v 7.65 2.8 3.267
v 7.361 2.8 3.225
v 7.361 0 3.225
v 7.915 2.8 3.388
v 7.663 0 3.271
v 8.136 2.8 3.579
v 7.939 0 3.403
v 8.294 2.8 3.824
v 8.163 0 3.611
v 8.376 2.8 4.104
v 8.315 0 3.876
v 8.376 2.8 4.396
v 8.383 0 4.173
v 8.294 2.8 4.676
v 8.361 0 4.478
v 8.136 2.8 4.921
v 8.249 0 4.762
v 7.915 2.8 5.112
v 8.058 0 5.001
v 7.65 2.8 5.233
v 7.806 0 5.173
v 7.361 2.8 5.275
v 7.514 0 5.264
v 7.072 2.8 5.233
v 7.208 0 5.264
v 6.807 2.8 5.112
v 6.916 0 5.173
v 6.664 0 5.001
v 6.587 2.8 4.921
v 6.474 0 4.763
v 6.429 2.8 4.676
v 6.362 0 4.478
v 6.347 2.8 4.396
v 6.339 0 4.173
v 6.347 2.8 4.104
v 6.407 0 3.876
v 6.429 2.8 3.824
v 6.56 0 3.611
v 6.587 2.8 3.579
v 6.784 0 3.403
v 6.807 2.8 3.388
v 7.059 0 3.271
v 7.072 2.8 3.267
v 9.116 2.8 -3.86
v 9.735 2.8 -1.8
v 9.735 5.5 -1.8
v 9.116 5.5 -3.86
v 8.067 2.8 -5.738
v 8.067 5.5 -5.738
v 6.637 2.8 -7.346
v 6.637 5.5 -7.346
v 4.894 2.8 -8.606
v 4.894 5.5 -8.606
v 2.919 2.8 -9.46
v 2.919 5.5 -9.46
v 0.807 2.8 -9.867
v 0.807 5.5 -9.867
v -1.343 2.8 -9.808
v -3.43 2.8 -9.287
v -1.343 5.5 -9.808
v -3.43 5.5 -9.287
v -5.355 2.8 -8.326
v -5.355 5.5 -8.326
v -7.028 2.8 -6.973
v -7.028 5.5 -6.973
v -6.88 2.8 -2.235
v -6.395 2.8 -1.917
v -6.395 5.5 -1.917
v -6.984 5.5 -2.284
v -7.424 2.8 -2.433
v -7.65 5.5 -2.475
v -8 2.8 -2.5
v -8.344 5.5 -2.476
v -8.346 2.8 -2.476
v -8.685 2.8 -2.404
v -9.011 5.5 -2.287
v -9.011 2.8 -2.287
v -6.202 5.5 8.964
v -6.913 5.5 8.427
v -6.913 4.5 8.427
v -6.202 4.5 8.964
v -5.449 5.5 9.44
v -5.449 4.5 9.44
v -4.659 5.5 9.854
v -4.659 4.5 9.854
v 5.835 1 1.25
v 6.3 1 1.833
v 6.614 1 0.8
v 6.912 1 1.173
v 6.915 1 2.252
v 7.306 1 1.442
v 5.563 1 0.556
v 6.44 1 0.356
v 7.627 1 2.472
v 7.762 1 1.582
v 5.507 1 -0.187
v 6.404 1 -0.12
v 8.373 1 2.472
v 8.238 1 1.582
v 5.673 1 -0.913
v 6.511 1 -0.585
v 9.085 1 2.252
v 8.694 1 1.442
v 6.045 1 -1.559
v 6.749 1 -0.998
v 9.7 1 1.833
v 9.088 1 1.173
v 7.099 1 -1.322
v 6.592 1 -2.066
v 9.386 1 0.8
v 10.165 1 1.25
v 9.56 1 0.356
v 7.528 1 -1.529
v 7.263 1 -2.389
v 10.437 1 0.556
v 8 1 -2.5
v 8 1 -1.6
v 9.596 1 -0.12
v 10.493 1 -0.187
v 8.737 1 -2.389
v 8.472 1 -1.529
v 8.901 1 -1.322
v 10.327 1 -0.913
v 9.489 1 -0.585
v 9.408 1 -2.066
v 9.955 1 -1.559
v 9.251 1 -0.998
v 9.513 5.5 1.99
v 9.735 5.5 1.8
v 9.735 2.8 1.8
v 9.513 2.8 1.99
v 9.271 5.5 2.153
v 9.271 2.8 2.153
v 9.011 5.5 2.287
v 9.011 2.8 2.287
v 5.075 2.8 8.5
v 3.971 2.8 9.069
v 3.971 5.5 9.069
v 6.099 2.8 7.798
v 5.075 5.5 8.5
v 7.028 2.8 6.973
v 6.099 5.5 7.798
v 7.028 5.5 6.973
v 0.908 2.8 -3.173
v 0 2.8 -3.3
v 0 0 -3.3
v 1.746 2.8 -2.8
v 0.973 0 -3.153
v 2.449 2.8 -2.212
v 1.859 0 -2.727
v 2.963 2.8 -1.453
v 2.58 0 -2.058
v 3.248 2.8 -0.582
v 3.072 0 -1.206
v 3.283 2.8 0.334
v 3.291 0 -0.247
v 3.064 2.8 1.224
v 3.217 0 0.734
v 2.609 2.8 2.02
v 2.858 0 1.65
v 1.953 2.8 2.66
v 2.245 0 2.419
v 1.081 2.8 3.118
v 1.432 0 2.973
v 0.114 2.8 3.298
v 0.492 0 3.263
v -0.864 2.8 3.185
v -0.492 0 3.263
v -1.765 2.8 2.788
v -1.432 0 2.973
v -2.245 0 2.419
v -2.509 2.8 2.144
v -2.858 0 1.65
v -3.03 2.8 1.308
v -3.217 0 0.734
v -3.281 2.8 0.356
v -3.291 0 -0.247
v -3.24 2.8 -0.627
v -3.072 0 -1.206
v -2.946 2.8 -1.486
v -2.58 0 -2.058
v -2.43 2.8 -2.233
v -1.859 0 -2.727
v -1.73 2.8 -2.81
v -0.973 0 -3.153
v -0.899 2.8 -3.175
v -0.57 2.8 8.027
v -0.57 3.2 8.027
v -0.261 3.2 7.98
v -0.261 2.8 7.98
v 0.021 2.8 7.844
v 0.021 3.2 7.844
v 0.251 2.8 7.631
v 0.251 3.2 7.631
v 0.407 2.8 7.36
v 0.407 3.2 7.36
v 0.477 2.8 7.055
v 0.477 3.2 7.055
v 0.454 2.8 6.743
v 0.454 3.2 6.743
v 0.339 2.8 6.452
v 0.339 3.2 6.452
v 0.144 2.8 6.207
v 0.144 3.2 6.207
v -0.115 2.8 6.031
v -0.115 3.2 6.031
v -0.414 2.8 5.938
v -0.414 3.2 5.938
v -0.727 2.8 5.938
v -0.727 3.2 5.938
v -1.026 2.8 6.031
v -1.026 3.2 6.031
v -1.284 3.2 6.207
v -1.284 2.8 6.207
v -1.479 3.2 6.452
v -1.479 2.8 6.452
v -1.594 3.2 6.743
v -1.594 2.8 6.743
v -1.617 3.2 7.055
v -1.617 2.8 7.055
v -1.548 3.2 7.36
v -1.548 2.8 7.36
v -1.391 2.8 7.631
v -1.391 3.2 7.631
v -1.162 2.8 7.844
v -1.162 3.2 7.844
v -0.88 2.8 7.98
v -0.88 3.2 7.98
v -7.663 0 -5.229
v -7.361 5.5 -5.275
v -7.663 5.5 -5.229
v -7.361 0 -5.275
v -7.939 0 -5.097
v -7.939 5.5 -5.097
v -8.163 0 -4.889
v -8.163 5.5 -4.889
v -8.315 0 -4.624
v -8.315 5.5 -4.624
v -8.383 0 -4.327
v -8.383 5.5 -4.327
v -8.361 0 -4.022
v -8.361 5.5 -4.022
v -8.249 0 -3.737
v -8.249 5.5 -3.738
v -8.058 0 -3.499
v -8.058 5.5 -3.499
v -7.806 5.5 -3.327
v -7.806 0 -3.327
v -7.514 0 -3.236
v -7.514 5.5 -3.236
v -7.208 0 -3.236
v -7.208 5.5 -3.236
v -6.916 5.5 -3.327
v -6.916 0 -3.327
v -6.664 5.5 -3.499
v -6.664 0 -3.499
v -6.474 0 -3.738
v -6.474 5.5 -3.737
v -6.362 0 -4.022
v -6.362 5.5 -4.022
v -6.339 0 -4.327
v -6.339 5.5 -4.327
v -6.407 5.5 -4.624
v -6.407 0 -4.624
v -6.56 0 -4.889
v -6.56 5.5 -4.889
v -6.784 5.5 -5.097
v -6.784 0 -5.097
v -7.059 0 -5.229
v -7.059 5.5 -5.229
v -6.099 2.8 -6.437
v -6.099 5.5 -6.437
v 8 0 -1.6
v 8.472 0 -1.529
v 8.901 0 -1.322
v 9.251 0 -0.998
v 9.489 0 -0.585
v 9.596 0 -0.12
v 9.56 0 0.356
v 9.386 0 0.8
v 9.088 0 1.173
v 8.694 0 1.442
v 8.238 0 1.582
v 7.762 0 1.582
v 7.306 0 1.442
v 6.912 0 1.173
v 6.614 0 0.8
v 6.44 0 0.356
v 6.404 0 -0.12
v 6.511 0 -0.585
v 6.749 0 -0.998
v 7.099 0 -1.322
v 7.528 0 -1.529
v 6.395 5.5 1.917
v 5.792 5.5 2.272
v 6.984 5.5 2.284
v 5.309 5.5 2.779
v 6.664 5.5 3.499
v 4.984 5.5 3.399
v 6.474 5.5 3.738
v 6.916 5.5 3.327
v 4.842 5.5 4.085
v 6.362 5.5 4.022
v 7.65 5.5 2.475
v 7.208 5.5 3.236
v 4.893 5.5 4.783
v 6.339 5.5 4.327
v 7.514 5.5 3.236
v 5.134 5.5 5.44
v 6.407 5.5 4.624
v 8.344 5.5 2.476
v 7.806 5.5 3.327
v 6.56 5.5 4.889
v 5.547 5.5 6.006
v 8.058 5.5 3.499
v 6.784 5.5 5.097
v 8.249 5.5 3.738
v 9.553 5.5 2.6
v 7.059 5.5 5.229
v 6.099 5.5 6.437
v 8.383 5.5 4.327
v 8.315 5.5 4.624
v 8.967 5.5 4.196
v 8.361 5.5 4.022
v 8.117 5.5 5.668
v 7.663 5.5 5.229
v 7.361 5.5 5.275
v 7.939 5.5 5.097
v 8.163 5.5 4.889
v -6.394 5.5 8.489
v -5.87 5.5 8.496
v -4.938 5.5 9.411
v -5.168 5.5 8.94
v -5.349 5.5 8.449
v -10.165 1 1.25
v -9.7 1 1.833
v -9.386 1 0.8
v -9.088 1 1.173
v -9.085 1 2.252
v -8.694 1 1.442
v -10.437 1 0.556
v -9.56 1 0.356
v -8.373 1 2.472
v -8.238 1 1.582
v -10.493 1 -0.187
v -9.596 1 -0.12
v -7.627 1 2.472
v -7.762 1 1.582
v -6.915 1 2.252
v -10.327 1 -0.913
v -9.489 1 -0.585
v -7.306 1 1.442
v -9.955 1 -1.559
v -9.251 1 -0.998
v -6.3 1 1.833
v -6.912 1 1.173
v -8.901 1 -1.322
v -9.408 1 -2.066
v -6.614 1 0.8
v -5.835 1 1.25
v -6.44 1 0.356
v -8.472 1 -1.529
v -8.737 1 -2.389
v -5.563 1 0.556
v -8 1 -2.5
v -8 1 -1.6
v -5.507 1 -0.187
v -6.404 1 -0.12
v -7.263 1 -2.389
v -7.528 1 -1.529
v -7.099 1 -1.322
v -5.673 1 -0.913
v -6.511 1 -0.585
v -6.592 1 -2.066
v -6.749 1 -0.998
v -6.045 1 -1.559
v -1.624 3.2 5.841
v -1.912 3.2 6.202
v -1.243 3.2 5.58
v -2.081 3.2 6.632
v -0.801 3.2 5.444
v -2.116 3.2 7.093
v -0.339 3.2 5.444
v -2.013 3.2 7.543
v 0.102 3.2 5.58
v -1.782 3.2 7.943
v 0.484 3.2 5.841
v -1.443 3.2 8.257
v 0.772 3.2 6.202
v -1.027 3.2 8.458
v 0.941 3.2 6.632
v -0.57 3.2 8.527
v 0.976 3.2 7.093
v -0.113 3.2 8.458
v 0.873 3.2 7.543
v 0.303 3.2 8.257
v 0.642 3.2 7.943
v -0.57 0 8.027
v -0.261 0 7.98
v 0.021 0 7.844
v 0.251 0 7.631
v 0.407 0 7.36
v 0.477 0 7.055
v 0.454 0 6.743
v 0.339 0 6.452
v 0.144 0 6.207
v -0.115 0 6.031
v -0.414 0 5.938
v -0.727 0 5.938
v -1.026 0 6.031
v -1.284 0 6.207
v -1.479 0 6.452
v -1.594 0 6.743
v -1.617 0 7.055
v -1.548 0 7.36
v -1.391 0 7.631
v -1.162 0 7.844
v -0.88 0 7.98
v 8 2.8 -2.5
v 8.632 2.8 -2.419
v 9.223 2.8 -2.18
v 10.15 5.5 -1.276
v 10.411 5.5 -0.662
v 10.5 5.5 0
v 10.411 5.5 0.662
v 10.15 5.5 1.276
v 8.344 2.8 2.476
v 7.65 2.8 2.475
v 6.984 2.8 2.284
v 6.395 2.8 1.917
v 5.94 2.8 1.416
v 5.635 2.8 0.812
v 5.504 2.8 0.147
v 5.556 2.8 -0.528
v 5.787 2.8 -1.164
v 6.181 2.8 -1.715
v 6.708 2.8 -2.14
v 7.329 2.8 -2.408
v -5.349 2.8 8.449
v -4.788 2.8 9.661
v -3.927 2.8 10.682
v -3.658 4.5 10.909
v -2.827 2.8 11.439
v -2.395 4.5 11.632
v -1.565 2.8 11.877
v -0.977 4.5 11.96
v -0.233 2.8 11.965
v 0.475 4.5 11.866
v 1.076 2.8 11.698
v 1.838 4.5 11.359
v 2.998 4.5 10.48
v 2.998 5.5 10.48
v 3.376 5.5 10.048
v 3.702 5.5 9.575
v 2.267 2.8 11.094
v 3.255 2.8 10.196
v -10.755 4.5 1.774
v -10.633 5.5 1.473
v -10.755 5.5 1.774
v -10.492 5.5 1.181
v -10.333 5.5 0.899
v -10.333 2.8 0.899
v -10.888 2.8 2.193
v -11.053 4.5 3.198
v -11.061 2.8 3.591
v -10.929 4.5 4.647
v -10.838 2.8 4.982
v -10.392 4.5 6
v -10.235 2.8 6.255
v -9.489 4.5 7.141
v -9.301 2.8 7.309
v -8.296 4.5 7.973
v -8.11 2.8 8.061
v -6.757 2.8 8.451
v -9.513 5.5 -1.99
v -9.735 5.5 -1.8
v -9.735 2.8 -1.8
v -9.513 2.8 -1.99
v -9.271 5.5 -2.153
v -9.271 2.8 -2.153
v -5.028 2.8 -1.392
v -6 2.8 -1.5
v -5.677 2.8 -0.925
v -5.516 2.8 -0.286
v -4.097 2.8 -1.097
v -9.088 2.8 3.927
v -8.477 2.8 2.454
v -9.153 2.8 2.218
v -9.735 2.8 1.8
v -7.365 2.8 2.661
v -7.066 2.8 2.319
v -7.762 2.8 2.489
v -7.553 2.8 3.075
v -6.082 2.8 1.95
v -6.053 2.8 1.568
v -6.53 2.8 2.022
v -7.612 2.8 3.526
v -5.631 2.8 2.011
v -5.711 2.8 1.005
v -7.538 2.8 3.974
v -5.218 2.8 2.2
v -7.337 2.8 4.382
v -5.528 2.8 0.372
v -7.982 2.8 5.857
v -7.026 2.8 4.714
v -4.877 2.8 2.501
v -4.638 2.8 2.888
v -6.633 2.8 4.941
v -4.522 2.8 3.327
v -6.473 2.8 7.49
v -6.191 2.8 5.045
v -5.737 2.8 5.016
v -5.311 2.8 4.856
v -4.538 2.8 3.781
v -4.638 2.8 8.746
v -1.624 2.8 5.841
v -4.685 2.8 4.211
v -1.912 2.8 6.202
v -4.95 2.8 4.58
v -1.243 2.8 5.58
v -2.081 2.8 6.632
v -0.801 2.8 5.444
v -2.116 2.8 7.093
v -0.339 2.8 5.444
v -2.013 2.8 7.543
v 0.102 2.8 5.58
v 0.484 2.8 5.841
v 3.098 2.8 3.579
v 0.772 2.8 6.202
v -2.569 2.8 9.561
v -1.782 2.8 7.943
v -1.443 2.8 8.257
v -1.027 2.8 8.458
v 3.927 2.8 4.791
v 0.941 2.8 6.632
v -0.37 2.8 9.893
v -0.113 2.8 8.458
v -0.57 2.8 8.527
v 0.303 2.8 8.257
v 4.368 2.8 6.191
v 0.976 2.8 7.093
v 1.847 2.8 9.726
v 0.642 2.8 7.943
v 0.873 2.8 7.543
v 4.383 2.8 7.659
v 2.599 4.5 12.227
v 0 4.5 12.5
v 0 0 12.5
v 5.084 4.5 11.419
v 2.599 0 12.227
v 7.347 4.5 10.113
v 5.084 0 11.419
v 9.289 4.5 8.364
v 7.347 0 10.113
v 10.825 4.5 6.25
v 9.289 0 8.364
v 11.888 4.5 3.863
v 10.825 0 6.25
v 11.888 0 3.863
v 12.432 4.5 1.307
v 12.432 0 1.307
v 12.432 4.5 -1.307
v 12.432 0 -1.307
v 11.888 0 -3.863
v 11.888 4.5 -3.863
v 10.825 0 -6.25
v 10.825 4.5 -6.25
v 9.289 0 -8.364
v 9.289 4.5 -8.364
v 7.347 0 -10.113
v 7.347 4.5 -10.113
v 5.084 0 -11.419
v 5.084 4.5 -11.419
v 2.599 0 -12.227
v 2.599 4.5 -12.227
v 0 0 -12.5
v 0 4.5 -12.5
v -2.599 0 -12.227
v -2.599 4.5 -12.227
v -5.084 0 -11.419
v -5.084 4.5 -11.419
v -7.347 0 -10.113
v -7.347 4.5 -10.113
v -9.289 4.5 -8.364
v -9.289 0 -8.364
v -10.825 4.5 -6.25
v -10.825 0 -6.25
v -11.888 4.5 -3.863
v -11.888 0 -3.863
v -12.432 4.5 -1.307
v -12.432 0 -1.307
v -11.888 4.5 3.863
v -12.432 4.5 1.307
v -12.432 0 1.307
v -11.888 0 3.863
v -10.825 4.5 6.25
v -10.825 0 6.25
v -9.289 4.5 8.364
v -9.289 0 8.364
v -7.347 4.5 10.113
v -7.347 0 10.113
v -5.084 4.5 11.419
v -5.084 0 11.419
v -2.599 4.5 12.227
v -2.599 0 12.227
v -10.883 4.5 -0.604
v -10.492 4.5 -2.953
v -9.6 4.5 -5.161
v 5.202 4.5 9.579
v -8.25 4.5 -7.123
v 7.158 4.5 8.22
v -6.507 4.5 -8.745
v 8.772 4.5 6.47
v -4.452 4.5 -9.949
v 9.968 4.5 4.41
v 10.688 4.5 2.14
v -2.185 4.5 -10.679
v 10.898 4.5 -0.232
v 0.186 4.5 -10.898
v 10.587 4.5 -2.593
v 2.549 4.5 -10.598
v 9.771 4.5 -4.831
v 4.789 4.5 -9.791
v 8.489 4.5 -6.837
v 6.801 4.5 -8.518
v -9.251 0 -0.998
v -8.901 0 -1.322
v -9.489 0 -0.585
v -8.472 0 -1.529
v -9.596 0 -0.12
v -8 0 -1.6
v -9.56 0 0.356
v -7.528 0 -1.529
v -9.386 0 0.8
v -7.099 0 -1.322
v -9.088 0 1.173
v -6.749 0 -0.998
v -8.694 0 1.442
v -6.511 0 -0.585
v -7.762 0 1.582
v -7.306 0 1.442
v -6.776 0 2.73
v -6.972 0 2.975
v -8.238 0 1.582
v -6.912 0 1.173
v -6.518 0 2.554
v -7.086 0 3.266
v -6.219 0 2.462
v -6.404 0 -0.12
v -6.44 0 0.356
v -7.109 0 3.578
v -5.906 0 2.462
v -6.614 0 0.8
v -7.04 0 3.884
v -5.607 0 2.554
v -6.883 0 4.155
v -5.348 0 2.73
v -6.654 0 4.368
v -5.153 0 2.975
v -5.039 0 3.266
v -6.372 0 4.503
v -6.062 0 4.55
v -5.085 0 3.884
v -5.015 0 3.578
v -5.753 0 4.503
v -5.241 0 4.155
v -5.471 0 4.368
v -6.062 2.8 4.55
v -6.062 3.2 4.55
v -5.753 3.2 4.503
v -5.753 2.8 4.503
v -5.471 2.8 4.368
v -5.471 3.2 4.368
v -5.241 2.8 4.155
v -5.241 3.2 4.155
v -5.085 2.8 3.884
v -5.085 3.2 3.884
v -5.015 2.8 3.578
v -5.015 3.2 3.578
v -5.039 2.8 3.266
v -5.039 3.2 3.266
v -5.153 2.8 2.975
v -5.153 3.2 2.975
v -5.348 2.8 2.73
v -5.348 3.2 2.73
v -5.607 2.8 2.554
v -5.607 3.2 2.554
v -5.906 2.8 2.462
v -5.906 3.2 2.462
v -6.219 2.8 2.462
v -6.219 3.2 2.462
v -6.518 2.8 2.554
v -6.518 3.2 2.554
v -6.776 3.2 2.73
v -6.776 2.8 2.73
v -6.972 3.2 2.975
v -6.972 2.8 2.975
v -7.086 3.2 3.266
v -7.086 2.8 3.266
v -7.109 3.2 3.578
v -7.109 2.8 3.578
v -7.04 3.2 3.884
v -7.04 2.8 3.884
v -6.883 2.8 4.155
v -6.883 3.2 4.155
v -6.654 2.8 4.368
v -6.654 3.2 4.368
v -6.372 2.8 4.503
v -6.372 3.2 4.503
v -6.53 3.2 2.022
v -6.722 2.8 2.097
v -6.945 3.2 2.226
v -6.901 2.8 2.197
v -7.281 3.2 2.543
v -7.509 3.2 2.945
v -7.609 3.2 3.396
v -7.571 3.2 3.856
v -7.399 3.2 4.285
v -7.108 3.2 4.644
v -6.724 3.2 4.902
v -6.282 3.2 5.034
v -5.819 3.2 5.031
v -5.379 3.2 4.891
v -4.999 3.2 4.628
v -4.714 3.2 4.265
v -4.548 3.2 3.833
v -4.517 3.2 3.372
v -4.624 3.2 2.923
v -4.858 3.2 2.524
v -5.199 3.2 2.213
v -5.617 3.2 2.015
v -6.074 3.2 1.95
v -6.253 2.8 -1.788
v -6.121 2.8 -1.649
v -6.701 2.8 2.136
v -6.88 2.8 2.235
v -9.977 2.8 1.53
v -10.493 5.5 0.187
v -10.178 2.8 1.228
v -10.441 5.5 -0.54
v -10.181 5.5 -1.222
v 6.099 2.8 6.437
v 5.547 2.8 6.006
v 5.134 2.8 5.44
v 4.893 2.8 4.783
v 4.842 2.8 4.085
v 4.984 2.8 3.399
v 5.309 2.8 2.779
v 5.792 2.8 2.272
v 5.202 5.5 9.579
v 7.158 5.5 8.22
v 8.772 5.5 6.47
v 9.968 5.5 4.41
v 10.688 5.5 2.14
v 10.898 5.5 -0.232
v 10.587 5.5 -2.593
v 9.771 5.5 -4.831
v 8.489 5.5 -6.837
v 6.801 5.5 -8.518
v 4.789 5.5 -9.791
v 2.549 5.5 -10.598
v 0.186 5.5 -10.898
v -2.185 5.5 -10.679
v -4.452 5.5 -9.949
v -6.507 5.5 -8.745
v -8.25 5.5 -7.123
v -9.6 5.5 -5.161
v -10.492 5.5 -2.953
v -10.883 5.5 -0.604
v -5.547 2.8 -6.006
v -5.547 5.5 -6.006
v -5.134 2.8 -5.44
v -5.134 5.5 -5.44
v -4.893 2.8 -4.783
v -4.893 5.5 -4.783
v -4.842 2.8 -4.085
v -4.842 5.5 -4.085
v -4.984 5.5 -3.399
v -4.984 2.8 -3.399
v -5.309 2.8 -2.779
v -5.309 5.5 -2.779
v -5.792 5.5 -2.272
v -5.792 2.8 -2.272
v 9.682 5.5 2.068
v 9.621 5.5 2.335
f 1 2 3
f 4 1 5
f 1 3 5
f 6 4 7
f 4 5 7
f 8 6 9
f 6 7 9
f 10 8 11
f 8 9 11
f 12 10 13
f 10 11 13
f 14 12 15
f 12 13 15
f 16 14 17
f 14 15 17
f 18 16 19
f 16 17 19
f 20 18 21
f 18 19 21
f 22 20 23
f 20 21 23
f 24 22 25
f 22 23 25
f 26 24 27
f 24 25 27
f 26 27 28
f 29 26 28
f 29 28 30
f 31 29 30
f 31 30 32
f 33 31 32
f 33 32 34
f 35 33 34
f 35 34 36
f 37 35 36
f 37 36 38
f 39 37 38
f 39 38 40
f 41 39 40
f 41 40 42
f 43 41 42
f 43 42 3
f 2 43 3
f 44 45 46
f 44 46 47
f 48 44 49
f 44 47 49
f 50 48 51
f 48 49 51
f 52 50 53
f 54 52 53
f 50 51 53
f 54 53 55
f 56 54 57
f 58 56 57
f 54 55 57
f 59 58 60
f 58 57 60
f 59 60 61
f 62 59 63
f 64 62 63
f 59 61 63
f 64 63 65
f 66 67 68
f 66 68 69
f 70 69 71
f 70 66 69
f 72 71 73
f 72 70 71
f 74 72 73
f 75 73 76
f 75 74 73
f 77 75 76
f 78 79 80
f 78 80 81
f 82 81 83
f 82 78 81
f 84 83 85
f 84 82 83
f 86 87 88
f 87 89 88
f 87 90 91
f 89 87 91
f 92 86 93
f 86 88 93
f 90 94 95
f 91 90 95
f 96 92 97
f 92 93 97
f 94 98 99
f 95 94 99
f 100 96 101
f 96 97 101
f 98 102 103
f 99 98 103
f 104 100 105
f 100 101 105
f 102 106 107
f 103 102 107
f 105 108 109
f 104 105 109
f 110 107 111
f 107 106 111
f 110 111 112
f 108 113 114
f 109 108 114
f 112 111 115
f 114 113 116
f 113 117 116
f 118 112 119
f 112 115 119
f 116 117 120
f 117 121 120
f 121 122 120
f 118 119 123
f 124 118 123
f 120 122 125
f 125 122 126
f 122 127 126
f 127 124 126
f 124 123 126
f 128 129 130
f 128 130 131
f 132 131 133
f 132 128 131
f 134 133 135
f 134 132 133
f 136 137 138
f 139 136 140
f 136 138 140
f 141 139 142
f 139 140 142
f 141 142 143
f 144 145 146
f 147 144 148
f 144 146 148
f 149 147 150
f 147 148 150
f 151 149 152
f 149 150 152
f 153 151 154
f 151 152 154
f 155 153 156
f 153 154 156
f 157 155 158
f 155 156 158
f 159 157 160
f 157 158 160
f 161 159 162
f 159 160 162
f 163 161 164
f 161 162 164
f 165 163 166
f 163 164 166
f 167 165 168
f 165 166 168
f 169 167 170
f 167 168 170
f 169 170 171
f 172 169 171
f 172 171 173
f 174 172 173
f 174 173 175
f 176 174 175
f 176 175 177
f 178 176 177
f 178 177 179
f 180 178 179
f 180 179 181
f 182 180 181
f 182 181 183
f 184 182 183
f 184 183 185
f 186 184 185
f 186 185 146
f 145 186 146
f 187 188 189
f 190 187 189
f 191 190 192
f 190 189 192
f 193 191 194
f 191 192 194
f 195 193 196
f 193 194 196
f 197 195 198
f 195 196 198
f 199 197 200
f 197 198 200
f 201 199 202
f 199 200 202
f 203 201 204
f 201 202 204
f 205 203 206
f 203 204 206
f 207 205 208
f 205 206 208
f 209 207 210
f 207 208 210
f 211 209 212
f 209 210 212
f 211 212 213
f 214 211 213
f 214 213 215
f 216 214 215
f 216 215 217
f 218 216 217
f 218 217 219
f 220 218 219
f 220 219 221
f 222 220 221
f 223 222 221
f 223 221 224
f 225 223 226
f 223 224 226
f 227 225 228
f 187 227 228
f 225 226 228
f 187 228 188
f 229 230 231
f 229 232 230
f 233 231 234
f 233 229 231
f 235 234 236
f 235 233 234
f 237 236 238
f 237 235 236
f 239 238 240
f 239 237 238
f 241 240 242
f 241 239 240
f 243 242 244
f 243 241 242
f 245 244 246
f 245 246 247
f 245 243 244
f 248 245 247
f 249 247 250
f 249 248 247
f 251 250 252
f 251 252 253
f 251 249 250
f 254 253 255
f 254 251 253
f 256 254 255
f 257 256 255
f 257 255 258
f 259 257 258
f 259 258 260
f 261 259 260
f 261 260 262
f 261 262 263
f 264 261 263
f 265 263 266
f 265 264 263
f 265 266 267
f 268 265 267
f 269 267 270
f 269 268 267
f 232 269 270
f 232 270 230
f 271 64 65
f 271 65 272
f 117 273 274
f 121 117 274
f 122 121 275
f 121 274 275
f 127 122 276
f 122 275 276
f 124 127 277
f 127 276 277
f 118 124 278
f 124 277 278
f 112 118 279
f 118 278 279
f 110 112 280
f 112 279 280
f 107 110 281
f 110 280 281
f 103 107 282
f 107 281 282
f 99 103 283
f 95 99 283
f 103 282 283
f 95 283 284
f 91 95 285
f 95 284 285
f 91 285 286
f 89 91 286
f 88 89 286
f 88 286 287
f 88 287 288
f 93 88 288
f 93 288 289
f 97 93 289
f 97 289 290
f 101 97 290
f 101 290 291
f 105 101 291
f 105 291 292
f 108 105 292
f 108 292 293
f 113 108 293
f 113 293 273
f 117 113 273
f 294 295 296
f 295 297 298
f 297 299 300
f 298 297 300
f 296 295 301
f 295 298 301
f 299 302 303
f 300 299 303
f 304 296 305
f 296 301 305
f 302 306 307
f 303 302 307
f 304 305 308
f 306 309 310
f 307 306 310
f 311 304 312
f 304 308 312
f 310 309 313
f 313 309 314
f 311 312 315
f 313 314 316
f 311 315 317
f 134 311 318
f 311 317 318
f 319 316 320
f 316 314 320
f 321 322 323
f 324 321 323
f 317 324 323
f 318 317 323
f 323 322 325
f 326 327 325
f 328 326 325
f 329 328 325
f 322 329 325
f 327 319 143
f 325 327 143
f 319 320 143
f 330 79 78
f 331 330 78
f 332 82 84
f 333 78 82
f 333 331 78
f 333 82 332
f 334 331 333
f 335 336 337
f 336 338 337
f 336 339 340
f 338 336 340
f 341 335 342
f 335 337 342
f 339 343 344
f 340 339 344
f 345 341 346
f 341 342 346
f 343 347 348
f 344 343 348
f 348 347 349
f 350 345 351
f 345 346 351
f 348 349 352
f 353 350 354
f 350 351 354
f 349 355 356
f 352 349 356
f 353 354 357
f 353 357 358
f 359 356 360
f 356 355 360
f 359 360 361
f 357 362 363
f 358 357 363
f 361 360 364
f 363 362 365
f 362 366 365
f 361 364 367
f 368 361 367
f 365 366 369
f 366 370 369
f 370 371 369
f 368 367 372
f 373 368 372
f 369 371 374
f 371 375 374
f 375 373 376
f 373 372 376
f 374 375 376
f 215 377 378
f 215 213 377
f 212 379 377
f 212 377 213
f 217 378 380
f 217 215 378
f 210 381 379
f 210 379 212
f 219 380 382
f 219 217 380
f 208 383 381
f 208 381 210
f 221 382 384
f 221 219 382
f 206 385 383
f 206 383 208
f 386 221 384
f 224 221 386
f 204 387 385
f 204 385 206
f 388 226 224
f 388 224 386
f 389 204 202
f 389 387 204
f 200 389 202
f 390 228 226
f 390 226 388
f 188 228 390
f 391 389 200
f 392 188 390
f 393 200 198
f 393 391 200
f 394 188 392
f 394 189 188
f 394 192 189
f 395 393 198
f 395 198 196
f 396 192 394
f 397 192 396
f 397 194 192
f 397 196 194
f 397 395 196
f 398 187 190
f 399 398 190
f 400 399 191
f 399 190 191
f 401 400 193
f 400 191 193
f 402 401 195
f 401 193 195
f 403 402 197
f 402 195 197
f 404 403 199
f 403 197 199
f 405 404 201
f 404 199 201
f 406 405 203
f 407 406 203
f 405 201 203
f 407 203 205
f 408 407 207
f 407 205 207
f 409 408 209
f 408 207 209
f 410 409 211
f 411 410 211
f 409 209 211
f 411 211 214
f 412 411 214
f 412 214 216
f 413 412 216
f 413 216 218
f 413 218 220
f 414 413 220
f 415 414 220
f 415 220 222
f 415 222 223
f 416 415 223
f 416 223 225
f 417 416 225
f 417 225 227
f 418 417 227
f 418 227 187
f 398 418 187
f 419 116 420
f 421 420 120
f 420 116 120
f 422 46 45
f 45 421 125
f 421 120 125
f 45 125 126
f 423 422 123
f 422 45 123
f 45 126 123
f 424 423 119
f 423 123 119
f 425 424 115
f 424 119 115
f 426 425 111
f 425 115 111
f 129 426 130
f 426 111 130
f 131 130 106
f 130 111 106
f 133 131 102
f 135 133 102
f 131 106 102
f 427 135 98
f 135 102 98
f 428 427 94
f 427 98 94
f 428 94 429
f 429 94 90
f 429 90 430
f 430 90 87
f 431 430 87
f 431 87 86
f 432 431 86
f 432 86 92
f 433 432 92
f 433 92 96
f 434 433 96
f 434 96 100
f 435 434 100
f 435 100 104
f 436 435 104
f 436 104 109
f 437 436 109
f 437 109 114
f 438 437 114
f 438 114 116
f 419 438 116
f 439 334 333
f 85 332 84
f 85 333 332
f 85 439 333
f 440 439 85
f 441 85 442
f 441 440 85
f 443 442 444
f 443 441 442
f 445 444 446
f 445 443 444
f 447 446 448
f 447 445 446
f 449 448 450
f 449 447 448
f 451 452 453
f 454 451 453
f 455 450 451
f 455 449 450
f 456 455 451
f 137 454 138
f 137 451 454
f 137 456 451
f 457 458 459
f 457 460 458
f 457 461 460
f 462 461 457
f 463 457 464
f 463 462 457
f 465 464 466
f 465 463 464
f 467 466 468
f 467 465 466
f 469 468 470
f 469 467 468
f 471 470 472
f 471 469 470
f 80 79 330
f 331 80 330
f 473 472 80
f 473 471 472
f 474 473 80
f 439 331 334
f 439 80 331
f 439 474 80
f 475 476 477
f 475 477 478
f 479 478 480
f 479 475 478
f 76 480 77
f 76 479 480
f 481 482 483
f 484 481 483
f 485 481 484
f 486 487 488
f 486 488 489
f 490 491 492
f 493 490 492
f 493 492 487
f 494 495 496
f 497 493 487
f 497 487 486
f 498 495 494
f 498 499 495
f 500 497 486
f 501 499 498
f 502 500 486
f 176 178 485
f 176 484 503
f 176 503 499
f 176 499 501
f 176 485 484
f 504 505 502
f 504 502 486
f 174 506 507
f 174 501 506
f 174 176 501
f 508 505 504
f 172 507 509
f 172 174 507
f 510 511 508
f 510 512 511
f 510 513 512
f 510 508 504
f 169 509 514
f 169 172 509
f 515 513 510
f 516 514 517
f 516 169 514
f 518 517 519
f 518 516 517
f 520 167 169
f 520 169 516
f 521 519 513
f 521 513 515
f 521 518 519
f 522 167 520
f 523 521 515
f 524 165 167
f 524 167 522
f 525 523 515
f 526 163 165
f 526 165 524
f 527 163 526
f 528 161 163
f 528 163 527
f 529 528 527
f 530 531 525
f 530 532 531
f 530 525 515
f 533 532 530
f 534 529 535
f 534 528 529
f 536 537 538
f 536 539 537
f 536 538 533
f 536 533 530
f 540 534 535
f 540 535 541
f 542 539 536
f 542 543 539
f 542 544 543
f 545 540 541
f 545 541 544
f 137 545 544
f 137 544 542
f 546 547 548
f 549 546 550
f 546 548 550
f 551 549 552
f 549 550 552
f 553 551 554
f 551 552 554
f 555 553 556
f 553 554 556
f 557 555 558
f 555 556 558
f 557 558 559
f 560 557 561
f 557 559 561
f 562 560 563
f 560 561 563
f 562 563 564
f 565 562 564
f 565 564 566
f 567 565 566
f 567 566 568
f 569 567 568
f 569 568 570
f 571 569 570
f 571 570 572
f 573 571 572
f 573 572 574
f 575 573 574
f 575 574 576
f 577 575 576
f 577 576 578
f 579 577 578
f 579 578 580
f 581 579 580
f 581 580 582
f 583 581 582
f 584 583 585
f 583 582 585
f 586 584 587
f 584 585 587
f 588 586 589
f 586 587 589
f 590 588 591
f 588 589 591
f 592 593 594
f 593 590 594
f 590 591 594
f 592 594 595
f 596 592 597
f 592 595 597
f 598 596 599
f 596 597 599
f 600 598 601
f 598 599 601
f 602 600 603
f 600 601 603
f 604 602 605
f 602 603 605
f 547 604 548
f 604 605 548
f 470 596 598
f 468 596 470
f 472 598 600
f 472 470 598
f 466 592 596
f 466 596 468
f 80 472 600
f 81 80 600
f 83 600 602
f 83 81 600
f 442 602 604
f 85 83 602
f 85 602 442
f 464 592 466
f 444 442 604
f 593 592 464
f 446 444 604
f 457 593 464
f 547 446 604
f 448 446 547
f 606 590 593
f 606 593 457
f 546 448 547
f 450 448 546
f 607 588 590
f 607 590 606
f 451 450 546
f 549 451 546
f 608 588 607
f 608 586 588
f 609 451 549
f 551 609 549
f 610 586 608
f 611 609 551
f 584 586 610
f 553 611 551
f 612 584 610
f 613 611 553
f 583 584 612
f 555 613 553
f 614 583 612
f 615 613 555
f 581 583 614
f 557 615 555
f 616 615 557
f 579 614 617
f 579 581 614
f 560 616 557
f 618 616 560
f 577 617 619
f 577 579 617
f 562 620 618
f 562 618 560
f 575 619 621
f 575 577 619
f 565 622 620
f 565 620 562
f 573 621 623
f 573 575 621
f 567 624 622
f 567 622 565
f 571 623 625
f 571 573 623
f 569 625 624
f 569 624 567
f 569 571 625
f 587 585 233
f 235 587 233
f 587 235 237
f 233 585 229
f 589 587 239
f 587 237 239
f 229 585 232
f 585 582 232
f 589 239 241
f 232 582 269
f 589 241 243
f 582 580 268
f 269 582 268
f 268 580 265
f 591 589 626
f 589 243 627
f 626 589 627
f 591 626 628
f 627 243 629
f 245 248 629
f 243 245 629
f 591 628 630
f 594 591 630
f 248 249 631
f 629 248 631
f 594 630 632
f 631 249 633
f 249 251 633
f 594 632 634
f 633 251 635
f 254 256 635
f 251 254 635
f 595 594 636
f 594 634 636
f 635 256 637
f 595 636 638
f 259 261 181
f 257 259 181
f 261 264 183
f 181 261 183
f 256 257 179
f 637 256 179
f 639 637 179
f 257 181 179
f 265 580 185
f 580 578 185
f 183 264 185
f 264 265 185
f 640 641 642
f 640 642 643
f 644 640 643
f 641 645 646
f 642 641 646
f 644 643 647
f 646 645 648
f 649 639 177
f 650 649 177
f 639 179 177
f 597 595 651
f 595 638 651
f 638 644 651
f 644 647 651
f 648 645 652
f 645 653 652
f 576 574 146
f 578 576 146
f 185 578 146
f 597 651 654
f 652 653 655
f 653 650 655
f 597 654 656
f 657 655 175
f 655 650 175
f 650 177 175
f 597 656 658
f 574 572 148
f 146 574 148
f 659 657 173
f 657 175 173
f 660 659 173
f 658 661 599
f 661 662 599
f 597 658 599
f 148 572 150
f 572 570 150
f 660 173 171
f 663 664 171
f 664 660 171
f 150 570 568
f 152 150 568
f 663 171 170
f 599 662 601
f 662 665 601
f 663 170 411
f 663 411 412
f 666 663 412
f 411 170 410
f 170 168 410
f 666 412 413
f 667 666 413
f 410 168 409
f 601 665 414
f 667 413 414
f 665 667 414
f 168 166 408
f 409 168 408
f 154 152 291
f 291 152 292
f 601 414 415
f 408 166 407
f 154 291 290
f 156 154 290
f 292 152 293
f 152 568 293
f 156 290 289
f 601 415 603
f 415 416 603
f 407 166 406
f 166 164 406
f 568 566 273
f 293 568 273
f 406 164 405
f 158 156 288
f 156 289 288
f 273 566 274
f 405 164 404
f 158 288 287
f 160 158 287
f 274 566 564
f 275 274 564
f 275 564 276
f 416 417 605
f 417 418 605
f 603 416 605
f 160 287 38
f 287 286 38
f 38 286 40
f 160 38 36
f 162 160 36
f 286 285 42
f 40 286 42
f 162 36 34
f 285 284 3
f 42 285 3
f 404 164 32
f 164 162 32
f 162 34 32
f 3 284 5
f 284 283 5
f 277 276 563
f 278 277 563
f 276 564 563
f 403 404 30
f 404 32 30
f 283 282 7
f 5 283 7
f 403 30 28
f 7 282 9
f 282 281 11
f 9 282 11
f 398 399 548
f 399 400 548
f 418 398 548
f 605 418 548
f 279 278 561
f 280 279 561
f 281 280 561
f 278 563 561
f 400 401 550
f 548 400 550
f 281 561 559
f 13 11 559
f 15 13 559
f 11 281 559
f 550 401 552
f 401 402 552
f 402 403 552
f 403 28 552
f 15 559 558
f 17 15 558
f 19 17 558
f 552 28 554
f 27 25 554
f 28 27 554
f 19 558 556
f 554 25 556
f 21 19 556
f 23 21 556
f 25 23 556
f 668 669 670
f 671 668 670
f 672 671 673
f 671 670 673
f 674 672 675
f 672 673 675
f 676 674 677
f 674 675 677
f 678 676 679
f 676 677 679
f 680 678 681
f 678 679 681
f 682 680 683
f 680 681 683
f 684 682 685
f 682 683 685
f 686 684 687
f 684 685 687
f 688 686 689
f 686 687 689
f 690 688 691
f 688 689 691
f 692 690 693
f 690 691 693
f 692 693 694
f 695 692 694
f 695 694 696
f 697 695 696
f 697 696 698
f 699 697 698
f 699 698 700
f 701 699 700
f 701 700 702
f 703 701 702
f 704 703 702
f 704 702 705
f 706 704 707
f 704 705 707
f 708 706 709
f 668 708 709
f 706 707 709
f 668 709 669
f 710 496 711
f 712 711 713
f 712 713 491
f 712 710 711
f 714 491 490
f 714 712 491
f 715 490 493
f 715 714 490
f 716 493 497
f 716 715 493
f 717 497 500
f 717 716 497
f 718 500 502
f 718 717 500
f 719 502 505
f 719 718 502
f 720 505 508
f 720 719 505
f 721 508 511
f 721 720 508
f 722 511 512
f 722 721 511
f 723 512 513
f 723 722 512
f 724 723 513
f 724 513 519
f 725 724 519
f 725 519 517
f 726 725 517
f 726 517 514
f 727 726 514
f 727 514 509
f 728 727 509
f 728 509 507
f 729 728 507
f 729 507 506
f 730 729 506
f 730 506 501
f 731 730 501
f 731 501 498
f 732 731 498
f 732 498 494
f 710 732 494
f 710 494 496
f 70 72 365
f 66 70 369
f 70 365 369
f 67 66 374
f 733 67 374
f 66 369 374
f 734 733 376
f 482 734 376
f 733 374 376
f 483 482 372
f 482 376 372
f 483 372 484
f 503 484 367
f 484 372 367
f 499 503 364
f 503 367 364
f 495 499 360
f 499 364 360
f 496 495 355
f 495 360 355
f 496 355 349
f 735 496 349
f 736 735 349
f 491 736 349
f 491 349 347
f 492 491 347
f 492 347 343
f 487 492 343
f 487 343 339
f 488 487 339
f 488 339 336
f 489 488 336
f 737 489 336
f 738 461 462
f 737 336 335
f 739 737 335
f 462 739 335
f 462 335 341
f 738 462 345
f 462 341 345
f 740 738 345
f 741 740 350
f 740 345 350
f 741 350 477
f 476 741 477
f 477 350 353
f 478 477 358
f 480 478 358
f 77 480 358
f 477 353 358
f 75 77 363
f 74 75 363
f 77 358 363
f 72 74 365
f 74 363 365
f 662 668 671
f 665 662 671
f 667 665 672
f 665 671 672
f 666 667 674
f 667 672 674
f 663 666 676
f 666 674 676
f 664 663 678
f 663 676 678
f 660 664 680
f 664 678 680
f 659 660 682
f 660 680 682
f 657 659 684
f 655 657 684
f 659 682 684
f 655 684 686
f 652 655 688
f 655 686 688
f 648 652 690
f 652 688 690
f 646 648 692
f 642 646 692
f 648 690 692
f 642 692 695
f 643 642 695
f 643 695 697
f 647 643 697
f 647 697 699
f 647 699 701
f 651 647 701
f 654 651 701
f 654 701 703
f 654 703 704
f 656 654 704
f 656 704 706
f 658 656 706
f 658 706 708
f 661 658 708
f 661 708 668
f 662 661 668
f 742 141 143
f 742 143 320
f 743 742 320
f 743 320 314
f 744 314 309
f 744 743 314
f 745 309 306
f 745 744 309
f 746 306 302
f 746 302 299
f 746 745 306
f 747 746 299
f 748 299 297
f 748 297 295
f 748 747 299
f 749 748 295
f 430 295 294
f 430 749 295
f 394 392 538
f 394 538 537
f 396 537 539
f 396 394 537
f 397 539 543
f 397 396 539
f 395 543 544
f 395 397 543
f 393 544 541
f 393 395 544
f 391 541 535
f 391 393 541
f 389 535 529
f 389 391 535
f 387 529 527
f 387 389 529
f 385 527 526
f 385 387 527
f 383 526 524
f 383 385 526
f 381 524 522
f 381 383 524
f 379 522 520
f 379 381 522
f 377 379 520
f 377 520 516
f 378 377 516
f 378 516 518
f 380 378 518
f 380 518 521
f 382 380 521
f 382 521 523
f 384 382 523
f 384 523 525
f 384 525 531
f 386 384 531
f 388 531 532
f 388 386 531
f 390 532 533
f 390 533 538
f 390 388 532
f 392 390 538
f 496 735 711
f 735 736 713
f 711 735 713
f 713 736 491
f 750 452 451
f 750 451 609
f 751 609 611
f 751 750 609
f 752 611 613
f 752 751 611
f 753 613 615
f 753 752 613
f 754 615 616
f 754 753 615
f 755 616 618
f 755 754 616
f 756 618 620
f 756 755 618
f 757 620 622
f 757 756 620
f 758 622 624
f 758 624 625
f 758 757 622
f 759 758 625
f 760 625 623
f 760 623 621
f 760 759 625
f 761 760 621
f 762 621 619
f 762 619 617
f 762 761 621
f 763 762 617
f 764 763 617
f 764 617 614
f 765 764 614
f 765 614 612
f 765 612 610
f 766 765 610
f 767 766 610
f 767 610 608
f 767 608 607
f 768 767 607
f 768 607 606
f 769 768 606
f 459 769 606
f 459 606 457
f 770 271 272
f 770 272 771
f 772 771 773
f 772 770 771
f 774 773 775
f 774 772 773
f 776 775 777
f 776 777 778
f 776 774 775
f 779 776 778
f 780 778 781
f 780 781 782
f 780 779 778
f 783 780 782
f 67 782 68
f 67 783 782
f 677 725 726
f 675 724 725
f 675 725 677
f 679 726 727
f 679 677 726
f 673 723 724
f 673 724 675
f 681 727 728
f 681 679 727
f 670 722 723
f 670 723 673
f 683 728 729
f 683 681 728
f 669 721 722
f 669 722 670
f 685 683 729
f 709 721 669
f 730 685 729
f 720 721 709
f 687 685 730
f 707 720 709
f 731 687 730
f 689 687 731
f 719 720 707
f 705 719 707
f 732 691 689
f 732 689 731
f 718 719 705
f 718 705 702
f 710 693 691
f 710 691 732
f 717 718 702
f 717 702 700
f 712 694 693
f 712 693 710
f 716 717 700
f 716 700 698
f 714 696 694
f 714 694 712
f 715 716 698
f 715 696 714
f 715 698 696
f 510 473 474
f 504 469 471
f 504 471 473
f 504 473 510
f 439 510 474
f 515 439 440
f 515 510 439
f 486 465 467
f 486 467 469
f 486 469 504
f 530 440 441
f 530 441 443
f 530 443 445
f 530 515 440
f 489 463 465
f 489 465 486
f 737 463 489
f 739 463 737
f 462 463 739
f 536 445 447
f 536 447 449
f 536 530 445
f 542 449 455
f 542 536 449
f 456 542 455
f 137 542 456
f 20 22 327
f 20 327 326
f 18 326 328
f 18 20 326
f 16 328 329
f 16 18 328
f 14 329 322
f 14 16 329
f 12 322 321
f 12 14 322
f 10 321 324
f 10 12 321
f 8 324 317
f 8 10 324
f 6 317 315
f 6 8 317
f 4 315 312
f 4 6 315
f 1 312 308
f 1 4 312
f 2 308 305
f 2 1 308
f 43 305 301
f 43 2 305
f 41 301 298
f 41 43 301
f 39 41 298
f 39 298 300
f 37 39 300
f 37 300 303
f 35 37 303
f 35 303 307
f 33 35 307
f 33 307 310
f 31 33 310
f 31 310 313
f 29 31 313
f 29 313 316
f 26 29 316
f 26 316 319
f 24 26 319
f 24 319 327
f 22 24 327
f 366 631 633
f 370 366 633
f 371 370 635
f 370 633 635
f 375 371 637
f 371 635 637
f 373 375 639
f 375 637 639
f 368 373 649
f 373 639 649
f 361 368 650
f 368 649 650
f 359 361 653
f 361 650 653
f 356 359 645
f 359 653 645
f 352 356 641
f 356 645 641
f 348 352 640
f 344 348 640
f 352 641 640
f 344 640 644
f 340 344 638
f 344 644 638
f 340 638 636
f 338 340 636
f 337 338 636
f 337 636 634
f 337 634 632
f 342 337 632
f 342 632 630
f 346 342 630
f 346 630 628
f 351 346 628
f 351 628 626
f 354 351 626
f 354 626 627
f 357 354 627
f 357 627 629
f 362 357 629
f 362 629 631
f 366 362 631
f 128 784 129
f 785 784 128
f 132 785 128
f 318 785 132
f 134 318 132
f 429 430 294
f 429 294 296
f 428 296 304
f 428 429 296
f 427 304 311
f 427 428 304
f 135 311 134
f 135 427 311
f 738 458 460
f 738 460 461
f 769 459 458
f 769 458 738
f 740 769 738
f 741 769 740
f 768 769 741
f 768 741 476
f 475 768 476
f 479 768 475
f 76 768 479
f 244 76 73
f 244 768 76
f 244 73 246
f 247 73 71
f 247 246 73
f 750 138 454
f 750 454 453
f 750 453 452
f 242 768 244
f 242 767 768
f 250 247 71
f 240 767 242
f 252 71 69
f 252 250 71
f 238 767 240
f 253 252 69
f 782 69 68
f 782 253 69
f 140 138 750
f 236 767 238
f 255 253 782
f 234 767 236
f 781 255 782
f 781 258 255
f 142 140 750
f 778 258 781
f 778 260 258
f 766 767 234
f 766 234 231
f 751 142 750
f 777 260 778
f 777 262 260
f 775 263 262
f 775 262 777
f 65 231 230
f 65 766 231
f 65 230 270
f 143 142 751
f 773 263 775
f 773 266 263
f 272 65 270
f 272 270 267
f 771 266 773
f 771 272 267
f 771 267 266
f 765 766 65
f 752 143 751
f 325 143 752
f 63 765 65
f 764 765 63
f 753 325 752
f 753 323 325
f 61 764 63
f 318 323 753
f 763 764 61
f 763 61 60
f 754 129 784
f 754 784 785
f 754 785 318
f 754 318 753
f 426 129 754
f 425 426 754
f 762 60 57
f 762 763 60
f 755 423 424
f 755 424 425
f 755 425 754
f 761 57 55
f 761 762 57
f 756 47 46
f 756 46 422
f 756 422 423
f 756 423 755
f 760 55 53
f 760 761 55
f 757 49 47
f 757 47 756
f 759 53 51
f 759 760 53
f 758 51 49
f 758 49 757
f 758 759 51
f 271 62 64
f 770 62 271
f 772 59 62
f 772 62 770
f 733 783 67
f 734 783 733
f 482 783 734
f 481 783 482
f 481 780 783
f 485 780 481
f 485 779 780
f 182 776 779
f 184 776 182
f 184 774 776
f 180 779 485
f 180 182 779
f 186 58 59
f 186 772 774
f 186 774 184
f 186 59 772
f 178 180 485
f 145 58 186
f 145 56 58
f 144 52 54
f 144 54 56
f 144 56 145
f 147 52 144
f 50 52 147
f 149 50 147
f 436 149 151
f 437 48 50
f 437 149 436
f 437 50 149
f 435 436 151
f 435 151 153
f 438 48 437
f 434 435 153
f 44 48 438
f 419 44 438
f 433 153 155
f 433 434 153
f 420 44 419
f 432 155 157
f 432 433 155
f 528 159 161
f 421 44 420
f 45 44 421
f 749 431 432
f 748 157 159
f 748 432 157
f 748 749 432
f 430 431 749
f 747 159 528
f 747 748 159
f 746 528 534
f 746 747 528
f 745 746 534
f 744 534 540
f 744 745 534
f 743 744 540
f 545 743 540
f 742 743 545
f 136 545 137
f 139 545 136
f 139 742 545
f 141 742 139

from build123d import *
from build123d.topology import SkipClean

# Parameters (mm, degrees)
SKETCH1_R           = 12.5
BOSS_EXTRUDE1_DEPTH = 5.5
SKETCH2_OUTSIDE_W   = 34.156
SKETCH2_OUTSIDE_H   = 34.156
SKETCH2_OUTSIDE_R   = 10.9
CUT_EXTRUDE1_DEPTH  = 1
SKETCH3_R           = 9.9
CUT_EXTRUDE2_DEPTH  = 2.7
SKETCH4_R           = 3.3
SKETCH4_R_2         = 1.6
CUT_EXTRUDE3_DEPTH  = 19.513508582
CUT_EXTRUDE4_START  = -1
SKETCH5_R           = 2.5
CUT_EXTRUDE4_DEPTH  = 18.513508582
SKETCH6_R           = 1.025
CUT_EXTRUDE5_DEPTH  = 19.513508582
SKETCH7_R           = 1.025
BOSS_EXTRUDE2_DEPTH = 2.7
BOSS_EXTRUDE3_START = 2.7
BOSS_EXTRUDE3_DEPTH = 2.7
CIRPATTERN1_COUNT   = 2
SKETCH9_R           = 1.05
CUT_EXTRUDE6_DEPTH  = 18.898044586
BOSS_EXTRUDE4_START = 0.4
SKETCH10_R          = 1.55
SKETCH10_R_2        = 1.05
BOSS_EXTRUDE4_DEPTH = 0.4
SKETCH11_R          = 1.55
CUT_EXTRUDE7_DEPTH  = 18.898044586


with BuildPart() as part:
    # Sketch1 → Boss-Extrude1 (new body)
    with BuildSketch(Plane(origin=(0, 0, 0), x_dir=(1, 0, 0), z_dir=(0, 1, 0))):
        with Locations(Location((0, 0, 0), (0, 0, 270))):
            Circle(SKETCH1_R)
    extrude(amount=BOSS_EXTRUDE1_DEPTH)

    # Sketch2 outside → Cut-Extrude1 (cut)
    with BuildSketch(Plane(origin=(0, 5.5, 0), x_dir=(1, 0, 0), z_dir=(0, 1, 0))):
        Rectangle(SKETCH2_OUTSIDE_W, SKETCH2_OUTSIDE_H)
        with Locations(Location((0, 0, 0), (0, 0, 270))):
            Circle(SKETCH2_OUTSIDE_R, mode=Mode.SUBTRACT)
    extrude(amount=-CUT_EXTRUDE1_DEPTH, mode=Mode.SUBTRACT)

    # Sketch3 → Cut-Extrude2 (cut)
    with BuildSketch(Plane(origin=(0, 5.5, 0), x_dir=(1, 0, 0), z_dir=(0, 1, 0))):
        with Locations(Location((0, 0, 0), (0, 0, 270))):
            Circle(SKETCH3_R)
    extrude(amount=-CUT_EXTRUDE2_DEPTH, mode=Mode.SUBTRACT)

    # Sketch4 → Cut-Extrude3 (cut, through all)
    with BuildSketch(Plane.XZ):
        with Locations(Location((0, 0, 0), (0, 0, 270))):
            Circle(SKETCH4_R)
        with Locations(Location((8, 0, 0), (0, 0, 270))):
            Circle(SKETCH4_R_2)
        with Locations(Location((-8, 0, 0), (0, 0, 270))):
            Circle(SKETCH4_R_2)
    extrude(amount=-CUT_EXTRUDE3_DEPTH, mode=Mode.SUBTRACT)

    # Sketch5 → Cut-Extrude4 (cut, through all)
    with BuildSketch(Plane.XZ.offset(CUT_EXTRUDE4_START)):
        with Locations(Location((-8, 0, 0), (0, 0, 270))):
            Circle(SKETCH5_R)
        with Locations(Location((8, 0, 0), (0, 0, 270))):
            Circle(SKETCH5_R)
    extrude(amount=-CUT_EXTRUDE4_DEPTH, mode=Mode.SUBTRACT)

    # Sketch6 → Cut-Extrude5 (cut, through all)
    with BuildSketch(Plane.XZ):
        with Locations(Location((-7.361215932, -4.25, 0), (0, 0, 270))):
            Circle(SKETCH6_R)
        with Locations(Location((7.361215932, 4.25, 0), (0, 0, 270))):
            Circle(SKETCH6_R)
    extrude(amount=-CUT_EXTRUDE5_DEPTH, mode=Mode.SUBTRACT)

    # Sketch7 → Boss-Extrude2 (add)
    with BuildSketch(Plane(origin=(0, 2.8, 0), x_dir=(1, 0, 0), z_dir=(0, 1, 0))):
        with BuildLine():
            Line((-7.027601402, 6.97300642), (-6.098715932, 6.436714145))
            ThreePointArc((-6.098715932, 6.436714145), (-4.841636094, 4.084644513), (-6.39533393, 1.917041158))
            ThreePointArc((-6.39533393, 1.917041158), (-7.650163067, 2.47540181), (-9.010579303, 2.286641527))
            Line((-9.010579303, 2.286641527), (-9.552601402, 2.599578131))
            ThreePointArc((-9.552601402, 2.599578131), (-8.573651497, 4.95), (-7.027601402, 6.97300642))
        make_face()
        with Locations(Location((-7.361215932, 4.25, 0), (0, 0, 90))):
            Circle(SKETCH7_R, mode=Mode.SUBTRACT)
    boss_extrude2 = extrude(amount=BOSS_EXTRUDE2_DEPTH)

    # Sketch8 → Boss-Extrude3 (add)
    with BuildSketch(Plane(origin=(0, 2.8, 0), x_dir=(1, 0, 0), z_dir=(0, 1, 0)).offset(BOSS_EXTRUDE3_START)):
        with BuildLine():
            Line((-9.010579303, 2.286641527), (-9.552601402, 2.599578131))
            ThreePointArc((-9.552601402, 2.599578131), (-9.652085176, 2.20164751), (-9.735, 1.799937499))
            ThreePointArc((-9.735, 1.799937499), (-9.394192107, 2.075145385), (-9.010579303, 2.286641527))
        make_face()
    boss_extrude3 = extrude(amount=-BOSS_EXTRUDE3_DEPTH)

    # CirPattern1: Boss-Extrude2, Boss-Extrude3 ×2 about axis
    with SkipClean():  # the faces are left unmerged after this step: merging them gives an invalid solid
        cirpattern1_axis = Axis((0, 0, 0), (0, 1, 0))
        add([boss_extrude2.rotate(cirpattern1_axis, i * 360 / CIRPATTERN1_COUNT) for i in range(1, CIRPATTERN1_COUNT)])
        add([boss_extrude3.rotate(cirpattern1_axis, i * 360 / CIRPATTERN1_COUNT) for i in range(1, CIRPATTERN1_COUNT)])

    # Sketch9 → Cut-Extrude6 (cut, through all)
    with SkipClean():  # the faces are left unmerged after this step: merging them gives an invalid solid
        with BuildSketch(Plane(origin=(0, 2.8, 0), x_dir=(1, 0, 0), z_dir=(0, 1, 0))):
            with Locations(Location((-6.062177826, -3.5, 0), (0, 0, 270))):
                Circle(SKETCH9_R)
            with Locations(Location((-0.570159055, -6.976741263, 0), (0, 0, 270))):
                Circle(SKETCH9_R)
        extrude(amount=-CUT_EXTRUDE6_DEPTH, mode=Mode.SUBTRACT)

    # Sketch10 → Boss-Extrude4 (add)
    # profile 1 of 2: a face of its own
    with SkipClean():  # the faces are left unmerged after this step: merging them gives an invalid solid
        with BuildSketch(Plane(origin=(0, 2.8, 0), x_dir=(1, 0, 0), z_dir=(0, 1, 0)).offset(BOSS_EXTRUDE4_START)):
            with Locations(Location((-6.062177826, -3.5, 0), (0, 0, 107.579513766))):
                Circle(SKETCH10_R)
            with Locations(Location((-6.062177826, -3.5, 0), (0, 0, 270))):
                Circle(SKETCH10_R_2, mode=Mode.SUBTRACT)
        # profile 2 of 2: a face of its own
        with BuildSketch(Plane(origin=(0, 2.8, 0), x_dir=(1, 0, 0), z_dir=(0, 1, 0)).offset(BOSS_EXTRUDE4_START)):
            with Locations(Location((-0.570159055, -6.976741263, 0), (0, 0, 270))):
                Circle(SKETCH10_R)
            with Locations(Location((-0.570159055, -6.976741263, 0), (0, 0, 270))):
                Circle(SKETCH10_R_2, mode=Mode.SUBTRACT)
        extrude(amount=-BOSS_EXTRUDE4_DEPTH)

    # Sketch11 → Cut-Extrude7 (cut, through all)
    with SkipClean():  # the faces are left unmerged after this step: merging them gives an invalid solid
        with BuildSketch(Plane(origin=(0, 2.8, 0), x_dir=(1, 0, 0), z_dir=(0, 1, 0))):
            with BuildLine():
                ThreePointArc((-1.283787966, -2.027929913), (-10.286807651, -0.825583644), (-5.348548915, -8.44881135))
                ThreePointArc((-5.348548915, -8.44881135), (3.65447077, -9.651157619), (-1.283787966, -2.027929913))
            make_face()
            with Locations(Location((-6.062177826, -3.5, 0), (0, 0, 107.579513766))):
                Circle(SKETCH11_R, mode=Mode.SUBTRACT)
            with Locations(Location((-0.570159055, -6.976741263, 0), (0, 0, 270))):
                Circle(SKETCH11_R, mode=Mode.SUBTRACT)
        extrude(amount=CUT_EXTRUDE7_DEPTH, mode=Mode.SUBTRACT)


solid = part.part
